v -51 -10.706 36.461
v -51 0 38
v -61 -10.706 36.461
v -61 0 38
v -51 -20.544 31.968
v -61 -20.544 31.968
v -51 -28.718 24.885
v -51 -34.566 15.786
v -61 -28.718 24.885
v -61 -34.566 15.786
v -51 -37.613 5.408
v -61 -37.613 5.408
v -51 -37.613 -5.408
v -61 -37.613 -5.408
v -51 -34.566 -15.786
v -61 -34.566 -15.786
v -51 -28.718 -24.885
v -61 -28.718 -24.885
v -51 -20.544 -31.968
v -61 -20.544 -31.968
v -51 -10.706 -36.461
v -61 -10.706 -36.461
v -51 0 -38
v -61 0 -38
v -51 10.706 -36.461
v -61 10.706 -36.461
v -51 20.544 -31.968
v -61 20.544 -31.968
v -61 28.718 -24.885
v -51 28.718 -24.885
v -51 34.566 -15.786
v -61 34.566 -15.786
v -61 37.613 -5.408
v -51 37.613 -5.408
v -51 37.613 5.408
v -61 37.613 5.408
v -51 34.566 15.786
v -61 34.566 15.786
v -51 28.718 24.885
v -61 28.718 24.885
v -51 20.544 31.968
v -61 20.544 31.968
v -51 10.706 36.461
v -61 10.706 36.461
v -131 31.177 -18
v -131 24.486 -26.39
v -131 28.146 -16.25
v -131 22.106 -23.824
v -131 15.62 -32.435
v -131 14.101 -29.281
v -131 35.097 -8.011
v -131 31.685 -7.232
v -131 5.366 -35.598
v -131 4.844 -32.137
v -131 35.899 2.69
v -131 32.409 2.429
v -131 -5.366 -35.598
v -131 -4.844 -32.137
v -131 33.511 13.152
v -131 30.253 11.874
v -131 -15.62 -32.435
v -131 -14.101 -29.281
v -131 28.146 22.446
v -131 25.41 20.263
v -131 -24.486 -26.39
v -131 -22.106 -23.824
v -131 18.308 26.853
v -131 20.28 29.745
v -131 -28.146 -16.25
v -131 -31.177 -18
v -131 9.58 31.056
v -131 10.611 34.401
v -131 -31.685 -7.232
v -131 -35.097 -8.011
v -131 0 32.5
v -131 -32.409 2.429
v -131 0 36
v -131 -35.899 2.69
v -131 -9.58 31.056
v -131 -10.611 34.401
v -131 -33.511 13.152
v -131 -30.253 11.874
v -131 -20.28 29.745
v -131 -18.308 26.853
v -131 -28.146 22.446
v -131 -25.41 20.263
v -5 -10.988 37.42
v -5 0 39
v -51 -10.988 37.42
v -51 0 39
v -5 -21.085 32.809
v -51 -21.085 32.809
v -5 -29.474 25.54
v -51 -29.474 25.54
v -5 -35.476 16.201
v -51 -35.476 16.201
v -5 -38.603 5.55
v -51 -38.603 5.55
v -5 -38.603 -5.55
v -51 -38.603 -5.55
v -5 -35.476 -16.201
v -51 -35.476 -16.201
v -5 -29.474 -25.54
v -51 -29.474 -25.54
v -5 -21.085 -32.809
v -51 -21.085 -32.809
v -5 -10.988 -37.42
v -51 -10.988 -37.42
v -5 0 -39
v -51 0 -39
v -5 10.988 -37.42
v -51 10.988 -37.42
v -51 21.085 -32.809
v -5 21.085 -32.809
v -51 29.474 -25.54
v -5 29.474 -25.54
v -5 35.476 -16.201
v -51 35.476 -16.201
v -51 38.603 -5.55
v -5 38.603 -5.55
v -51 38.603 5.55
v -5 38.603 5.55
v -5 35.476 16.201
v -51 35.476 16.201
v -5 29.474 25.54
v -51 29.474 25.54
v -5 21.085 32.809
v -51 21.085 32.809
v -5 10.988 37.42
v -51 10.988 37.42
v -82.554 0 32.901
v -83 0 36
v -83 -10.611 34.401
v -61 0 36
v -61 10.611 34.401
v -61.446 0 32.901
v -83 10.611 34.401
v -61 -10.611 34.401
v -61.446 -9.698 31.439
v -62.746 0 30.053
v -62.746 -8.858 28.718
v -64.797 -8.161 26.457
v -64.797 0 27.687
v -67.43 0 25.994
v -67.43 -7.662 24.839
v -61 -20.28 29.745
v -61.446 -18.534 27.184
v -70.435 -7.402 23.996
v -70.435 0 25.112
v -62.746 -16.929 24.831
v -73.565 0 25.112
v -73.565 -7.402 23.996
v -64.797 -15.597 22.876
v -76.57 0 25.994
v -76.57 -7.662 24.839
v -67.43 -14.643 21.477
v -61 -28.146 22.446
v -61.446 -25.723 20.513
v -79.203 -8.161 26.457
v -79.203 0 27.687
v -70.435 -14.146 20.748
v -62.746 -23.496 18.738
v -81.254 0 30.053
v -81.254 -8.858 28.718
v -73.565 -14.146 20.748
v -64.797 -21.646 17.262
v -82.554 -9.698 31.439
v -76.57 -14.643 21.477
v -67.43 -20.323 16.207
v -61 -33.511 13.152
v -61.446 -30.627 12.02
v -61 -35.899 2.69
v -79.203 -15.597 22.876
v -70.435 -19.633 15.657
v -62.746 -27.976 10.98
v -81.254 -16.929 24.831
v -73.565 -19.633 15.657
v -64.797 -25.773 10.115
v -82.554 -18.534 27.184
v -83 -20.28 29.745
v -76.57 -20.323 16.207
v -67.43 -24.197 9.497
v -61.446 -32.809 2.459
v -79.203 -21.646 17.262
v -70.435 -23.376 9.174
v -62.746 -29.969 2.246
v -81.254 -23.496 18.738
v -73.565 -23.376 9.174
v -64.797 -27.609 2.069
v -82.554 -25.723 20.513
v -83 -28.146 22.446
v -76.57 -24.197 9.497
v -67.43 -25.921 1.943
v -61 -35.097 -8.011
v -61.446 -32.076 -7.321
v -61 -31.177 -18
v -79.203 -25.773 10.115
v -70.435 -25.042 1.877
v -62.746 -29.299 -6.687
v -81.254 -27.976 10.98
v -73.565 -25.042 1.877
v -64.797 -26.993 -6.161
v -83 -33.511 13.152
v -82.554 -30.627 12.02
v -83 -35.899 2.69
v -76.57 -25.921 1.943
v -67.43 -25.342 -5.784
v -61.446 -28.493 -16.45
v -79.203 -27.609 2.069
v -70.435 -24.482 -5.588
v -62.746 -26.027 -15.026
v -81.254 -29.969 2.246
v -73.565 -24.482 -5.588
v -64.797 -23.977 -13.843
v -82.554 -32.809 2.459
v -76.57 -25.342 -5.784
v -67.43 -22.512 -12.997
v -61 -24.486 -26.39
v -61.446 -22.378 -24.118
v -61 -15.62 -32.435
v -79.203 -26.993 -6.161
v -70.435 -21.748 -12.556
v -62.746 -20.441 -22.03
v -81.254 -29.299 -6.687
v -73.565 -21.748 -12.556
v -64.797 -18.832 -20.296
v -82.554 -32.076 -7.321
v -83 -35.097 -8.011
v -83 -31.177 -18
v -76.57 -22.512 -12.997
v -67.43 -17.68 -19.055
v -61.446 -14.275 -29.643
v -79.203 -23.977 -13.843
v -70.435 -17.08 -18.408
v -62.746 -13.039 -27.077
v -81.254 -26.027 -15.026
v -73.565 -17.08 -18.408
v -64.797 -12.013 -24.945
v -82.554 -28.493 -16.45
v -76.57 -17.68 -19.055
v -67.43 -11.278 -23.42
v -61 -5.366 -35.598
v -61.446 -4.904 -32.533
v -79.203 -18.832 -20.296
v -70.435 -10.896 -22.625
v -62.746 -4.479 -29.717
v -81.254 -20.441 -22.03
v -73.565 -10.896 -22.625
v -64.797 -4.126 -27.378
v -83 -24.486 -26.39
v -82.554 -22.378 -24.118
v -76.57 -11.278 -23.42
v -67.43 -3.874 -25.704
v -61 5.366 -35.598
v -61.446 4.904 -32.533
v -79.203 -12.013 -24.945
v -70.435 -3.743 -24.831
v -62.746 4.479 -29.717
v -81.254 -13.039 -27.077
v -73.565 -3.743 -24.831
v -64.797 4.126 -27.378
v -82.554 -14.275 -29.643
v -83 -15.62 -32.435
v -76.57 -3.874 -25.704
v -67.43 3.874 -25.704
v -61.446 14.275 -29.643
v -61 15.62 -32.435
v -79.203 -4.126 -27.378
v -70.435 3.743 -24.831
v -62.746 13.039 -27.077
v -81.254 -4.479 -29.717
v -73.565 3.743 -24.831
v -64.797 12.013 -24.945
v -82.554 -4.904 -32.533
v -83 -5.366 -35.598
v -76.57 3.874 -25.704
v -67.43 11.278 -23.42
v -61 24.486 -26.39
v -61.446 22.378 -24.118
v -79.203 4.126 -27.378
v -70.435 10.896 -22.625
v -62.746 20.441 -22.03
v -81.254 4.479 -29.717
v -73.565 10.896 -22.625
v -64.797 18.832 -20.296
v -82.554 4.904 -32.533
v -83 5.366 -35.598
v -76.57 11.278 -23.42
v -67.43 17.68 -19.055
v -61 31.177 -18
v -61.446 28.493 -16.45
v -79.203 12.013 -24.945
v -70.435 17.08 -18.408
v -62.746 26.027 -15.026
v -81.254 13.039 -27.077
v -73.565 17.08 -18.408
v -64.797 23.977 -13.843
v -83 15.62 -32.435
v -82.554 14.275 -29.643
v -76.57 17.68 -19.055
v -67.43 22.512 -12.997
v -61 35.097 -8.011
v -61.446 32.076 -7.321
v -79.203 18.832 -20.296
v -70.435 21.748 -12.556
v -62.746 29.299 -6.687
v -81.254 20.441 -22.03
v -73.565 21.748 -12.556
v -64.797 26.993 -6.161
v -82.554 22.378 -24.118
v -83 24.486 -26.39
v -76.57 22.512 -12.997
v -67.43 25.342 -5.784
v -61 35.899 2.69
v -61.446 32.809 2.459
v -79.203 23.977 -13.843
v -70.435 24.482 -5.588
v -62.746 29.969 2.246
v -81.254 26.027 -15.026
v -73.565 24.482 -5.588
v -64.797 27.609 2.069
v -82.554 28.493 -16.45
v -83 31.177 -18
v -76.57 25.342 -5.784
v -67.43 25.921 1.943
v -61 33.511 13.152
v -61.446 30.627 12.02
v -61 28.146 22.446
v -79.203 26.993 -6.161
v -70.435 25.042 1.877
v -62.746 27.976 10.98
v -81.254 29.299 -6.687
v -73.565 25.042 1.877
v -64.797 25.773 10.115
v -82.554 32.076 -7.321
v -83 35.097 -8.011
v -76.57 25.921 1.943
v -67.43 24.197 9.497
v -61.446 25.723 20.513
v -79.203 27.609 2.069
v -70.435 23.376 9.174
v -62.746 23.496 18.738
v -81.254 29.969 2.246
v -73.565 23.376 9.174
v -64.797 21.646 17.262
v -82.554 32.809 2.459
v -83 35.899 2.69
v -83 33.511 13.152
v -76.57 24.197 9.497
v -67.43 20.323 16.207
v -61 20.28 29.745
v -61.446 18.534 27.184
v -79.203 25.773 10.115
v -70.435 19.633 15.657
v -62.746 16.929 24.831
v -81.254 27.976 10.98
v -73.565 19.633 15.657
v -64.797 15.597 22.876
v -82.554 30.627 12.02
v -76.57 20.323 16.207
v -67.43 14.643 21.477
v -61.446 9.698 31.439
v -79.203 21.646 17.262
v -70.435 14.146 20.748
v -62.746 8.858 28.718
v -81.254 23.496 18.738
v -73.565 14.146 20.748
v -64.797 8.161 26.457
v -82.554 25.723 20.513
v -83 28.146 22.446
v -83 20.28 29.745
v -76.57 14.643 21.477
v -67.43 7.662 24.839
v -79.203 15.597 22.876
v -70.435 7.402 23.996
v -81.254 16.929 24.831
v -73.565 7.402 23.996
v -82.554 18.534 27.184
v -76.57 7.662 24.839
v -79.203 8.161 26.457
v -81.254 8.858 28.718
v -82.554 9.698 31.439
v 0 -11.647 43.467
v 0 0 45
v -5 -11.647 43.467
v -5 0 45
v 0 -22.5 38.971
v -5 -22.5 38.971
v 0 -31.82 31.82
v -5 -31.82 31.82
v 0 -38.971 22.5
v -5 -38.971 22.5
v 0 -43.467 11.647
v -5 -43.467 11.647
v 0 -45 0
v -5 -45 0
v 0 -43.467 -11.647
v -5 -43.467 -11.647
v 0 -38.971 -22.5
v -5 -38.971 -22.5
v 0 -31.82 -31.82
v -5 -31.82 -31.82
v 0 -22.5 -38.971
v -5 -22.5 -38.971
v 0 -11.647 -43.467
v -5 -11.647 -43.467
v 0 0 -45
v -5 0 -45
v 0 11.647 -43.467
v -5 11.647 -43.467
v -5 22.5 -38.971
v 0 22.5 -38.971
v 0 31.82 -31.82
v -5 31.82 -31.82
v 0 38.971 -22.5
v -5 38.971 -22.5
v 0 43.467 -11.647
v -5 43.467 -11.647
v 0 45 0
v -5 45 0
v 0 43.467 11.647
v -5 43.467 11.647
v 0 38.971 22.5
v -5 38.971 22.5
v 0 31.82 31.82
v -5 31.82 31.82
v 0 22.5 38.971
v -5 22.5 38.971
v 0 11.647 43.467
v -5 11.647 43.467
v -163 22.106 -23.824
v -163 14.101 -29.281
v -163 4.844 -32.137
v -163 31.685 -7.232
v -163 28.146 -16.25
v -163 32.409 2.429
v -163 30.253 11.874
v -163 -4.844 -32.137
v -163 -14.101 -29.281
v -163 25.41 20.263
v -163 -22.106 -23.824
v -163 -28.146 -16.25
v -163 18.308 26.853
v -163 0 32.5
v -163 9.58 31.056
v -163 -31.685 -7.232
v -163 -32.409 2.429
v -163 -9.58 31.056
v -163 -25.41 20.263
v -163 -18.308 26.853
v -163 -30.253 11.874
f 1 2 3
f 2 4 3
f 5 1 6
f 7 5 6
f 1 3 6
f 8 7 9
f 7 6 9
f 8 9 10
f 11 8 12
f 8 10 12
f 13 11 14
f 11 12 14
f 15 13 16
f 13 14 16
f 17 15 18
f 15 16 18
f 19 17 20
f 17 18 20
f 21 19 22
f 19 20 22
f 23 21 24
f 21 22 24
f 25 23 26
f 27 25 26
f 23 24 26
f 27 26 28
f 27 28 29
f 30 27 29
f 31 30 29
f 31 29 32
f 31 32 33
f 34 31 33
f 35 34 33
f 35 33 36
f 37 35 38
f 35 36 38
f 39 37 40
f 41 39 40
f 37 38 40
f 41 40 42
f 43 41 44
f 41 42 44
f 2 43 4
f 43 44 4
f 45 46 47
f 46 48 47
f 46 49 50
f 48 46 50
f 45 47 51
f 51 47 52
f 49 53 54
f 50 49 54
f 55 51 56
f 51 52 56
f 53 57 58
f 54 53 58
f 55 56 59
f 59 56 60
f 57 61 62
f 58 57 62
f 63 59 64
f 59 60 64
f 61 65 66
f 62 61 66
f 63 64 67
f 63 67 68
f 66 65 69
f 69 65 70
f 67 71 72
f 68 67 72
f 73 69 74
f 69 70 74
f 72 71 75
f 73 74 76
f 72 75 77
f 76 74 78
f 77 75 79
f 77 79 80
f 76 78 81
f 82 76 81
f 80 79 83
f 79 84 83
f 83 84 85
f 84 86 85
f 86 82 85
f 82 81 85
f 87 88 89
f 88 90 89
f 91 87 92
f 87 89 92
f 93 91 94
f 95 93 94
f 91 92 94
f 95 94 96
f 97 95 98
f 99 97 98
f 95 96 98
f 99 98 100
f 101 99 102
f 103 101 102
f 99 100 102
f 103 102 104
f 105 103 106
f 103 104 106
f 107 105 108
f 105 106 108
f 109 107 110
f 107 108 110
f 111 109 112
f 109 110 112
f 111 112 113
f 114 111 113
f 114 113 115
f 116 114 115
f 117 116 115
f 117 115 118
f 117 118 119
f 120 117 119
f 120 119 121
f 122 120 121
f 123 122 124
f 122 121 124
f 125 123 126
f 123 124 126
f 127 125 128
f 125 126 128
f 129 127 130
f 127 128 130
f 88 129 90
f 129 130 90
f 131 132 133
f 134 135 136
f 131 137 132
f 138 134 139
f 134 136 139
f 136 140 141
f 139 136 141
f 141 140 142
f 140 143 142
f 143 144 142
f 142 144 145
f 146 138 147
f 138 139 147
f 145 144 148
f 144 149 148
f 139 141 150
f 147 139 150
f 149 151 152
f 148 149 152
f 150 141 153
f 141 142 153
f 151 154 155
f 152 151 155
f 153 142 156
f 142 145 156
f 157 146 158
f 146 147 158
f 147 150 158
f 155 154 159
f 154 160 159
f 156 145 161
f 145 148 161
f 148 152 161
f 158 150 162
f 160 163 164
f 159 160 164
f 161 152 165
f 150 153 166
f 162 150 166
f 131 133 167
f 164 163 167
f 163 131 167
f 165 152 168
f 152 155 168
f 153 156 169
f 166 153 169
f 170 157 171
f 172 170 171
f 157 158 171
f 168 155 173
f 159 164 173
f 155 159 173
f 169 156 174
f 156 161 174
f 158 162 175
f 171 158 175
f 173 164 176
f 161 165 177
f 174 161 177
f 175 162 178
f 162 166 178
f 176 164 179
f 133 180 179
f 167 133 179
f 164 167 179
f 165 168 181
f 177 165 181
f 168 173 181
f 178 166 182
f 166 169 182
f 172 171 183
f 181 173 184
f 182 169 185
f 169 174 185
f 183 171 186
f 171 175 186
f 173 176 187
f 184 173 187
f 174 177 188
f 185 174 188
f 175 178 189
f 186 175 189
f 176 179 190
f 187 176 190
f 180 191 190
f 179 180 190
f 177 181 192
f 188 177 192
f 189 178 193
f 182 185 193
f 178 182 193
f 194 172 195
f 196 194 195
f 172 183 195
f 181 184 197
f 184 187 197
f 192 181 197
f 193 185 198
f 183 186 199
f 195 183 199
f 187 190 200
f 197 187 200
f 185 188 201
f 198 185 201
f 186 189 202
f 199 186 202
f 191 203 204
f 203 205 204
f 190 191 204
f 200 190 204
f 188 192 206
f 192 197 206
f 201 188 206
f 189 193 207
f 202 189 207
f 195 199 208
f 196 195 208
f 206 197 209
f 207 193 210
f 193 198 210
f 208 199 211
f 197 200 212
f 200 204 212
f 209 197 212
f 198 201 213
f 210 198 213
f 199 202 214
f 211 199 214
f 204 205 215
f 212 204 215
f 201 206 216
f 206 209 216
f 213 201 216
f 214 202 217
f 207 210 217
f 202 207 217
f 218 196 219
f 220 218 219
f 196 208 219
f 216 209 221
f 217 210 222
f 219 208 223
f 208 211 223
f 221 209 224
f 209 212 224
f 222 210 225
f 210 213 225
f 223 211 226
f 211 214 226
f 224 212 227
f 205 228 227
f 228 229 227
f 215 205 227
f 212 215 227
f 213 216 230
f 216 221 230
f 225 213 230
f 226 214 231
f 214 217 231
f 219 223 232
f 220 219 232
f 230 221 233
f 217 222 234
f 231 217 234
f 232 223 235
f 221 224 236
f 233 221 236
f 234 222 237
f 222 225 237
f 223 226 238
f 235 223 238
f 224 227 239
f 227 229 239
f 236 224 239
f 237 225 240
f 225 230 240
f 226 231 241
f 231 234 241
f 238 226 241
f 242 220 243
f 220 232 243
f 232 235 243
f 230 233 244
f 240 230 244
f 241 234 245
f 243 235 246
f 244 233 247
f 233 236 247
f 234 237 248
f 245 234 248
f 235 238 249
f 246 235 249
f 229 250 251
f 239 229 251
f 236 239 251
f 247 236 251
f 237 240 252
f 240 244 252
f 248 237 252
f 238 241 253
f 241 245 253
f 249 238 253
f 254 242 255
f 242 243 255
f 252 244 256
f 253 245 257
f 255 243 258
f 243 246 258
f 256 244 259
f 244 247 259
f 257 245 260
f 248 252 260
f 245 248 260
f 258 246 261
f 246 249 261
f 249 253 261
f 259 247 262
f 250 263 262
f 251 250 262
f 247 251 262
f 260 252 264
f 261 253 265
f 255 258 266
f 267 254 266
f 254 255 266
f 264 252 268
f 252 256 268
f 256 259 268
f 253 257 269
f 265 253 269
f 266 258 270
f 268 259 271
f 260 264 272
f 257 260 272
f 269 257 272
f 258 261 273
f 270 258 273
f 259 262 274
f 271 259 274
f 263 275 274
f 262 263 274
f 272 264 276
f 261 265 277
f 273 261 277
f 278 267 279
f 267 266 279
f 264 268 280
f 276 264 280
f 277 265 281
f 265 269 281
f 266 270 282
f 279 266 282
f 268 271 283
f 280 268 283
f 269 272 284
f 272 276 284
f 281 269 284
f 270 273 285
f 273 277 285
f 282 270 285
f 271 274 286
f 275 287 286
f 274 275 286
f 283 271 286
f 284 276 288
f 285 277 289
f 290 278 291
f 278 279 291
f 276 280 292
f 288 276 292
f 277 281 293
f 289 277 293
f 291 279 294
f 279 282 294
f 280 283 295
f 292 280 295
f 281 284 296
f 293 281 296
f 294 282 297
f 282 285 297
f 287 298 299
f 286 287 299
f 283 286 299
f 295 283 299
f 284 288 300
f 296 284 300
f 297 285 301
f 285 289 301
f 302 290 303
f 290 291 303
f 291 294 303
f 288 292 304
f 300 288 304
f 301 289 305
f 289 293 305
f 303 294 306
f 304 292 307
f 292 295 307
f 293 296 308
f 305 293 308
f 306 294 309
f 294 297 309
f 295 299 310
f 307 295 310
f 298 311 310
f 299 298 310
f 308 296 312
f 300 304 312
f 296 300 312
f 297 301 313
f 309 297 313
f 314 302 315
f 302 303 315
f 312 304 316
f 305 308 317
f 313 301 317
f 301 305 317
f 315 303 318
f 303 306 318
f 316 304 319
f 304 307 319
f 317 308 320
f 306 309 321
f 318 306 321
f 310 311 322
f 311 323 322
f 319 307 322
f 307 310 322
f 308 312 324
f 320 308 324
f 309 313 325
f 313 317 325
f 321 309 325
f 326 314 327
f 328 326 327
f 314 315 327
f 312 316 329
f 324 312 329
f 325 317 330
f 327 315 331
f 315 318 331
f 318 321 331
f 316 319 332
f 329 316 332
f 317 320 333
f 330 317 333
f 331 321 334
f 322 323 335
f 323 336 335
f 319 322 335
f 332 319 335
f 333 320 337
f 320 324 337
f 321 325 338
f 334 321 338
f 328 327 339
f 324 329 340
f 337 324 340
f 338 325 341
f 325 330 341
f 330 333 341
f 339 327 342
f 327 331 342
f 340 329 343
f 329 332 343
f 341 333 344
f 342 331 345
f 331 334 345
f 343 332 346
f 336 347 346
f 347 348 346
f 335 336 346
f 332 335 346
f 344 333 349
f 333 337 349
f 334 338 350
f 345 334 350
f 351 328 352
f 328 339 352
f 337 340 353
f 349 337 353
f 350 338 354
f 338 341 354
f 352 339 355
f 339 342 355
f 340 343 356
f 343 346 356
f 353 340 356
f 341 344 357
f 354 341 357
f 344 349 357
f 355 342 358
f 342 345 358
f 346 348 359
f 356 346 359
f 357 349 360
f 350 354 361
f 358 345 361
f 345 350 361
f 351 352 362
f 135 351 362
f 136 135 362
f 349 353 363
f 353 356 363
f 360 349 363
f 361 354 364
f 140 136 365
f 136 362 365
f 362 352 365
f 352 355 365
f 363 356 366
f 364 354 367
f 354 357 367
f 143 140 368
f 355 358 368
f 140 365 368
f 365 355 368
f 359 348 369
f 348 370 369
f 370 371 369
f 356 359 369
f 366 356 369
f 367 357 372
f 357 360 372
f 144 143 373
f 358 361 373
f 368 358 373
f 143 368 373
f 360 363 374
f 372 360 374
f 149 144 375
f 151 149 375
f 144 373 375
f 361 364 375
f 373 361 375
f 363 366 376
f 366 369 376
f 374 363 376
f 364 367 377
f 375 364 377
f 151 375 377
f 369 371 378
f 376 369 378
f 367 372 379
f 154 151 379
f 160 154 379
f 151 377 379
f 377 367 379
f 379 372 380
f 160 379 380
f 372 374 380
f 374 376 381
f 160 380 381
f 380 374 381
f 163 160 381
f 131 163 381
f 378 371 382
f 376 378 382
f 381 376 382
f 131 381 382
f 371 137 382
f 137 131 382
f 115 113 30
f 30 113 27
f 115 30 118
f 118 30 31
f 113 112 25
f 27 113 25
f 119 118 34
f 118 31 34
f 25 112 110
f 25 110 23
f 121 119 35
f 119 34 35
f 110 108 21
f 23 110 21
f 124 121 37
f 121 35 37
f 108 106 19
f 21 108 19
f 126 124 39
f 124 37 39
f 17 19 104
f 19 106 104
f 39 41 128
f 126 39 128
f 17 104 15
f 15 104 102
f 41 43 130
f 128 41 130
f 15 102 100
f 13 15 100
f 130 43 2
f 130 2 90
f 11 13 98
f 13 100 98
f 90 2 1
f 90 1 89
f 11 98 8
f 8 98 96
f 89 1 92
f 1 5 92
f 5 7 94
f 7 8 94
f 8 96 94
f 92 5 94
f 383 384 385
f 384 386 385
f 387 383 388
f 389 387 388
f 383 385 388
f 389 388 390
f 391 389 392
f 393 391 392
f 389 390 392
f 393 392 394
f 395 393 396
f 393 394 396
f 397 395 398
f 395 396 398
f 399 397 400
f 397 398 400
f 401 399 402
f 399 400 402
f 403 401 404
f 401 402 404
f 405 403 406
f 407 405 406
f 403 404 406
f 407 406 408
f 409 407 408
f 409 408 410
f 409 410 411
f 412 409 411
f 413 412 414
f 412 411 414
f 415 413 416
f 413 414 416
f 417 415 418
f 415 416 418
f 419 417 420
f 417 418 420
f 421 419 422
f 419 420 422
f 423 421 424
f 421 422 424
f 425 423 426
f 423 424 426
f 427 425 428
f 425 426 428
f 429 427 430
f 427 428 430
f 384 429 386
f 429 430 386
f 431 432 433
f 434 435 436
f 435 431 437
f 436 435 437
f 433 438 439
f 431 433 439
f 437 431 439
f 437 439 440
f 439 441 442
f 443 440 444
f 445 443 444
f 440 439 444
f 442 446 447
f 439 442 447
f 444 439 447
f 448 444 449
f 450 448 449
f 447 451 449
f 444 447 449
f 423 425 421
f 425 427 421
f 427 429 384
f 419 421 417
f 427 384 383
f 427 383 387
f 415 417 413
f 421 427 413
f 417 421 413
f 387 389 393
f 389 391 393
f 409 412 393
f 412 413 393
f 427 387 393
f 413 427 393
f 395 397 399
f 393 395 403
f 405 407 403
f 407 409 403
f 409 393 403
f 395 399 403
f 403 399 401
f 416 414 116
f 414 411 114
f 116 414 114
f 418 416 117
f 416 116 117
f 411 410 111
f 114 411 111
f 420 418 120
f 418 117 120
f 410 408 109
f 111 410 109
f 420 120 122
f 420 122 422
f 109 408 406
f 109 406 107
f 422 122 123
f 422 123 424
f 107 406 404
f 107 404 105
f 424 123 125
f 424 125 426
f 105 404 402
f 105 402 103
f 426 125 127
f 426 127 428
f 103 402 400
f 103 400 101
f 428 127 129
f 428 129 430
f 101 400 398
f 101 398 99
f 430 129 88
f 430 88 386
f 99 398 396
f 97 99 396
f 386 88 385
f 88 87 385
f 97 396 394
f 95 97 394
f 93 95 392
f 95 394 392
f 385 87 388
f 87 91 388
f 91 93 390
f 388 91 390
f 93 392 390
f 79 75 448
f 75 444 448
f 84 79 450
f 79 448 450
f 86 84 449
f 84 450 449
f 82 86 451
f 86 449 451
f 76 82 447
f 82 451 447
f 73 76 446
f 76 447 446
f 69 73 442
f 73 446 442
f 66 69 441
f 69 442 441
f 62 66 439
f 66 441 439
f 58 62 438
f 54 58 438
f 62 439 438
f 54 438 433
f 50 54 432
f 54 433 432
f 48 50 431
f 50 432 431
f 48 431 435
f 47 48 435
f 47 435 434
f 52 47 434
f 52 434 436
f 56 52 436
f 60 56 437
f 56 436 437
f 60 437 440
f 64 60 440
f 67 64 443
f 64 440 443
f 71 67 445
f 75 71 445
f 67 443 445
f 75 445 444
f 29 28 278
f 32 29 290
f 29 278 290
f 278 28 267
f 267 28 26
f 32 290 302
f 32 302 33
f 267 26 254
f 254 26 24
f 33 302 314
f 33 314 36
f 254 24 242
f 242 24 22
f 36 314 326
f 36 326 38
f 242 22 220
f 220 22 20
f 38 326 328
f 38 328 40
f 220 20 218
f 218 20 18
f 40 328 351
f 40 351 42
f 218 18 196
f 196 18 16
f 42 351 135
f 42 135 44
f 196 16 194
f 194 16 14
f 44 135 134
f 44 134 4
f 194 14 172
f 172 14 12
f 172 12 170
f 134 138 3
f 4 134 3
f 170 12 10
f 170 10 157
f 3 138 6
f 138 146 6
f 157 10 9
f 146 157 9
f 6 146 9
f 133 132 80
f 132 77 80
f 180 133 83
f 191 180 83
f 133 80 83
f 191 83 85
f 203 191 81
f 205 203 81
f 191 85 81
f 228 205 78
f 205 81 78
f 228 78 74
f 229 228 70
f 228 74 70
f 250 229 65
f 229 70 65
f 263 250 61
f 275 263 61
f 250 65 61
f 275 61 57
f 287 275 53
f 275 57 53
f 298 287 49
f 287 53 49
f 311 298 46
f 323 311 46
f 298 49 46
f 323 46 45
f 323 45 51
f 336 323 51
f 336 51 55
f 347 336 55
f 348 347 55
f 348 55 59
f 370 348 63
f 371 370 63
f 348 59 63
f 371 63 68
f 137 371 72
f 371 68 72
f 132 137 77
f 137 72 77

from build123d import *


with BuildPart() as part:
    # Sketch1 → Revolve1 (revolve)
    with BuildSketch(Plane(origin=(0, 0, 0), x_dir=(-1, 0, 0), z_dir=(0, 1, 0))):
        with BuildLine():
            Line((0, 0), (0, 45))
            Line((0, 45), (5, 45))
            Line((5, 45), (5, 39))
            Line((5, 39), (51, 39))
            Line((51, 39), (51, 38))
            Line((51, 38), (61, 38))
            Line((61, 38), (61, 36))
            ThreePointArc((61, 36), (72, 25), (83, 36))
            Line((83, 36), (131, 36))
            Line((131, 36), (131, 32.5))
            Line((131, 32.5), (163, 32.5))
            Line((163, 32.5), (163, 0))
            Line((163, 0), (0, 0))
        make_face()
    revolve(axis=Axis((-163, 0, 0), (1, 0, 0)))


solid = part.part
